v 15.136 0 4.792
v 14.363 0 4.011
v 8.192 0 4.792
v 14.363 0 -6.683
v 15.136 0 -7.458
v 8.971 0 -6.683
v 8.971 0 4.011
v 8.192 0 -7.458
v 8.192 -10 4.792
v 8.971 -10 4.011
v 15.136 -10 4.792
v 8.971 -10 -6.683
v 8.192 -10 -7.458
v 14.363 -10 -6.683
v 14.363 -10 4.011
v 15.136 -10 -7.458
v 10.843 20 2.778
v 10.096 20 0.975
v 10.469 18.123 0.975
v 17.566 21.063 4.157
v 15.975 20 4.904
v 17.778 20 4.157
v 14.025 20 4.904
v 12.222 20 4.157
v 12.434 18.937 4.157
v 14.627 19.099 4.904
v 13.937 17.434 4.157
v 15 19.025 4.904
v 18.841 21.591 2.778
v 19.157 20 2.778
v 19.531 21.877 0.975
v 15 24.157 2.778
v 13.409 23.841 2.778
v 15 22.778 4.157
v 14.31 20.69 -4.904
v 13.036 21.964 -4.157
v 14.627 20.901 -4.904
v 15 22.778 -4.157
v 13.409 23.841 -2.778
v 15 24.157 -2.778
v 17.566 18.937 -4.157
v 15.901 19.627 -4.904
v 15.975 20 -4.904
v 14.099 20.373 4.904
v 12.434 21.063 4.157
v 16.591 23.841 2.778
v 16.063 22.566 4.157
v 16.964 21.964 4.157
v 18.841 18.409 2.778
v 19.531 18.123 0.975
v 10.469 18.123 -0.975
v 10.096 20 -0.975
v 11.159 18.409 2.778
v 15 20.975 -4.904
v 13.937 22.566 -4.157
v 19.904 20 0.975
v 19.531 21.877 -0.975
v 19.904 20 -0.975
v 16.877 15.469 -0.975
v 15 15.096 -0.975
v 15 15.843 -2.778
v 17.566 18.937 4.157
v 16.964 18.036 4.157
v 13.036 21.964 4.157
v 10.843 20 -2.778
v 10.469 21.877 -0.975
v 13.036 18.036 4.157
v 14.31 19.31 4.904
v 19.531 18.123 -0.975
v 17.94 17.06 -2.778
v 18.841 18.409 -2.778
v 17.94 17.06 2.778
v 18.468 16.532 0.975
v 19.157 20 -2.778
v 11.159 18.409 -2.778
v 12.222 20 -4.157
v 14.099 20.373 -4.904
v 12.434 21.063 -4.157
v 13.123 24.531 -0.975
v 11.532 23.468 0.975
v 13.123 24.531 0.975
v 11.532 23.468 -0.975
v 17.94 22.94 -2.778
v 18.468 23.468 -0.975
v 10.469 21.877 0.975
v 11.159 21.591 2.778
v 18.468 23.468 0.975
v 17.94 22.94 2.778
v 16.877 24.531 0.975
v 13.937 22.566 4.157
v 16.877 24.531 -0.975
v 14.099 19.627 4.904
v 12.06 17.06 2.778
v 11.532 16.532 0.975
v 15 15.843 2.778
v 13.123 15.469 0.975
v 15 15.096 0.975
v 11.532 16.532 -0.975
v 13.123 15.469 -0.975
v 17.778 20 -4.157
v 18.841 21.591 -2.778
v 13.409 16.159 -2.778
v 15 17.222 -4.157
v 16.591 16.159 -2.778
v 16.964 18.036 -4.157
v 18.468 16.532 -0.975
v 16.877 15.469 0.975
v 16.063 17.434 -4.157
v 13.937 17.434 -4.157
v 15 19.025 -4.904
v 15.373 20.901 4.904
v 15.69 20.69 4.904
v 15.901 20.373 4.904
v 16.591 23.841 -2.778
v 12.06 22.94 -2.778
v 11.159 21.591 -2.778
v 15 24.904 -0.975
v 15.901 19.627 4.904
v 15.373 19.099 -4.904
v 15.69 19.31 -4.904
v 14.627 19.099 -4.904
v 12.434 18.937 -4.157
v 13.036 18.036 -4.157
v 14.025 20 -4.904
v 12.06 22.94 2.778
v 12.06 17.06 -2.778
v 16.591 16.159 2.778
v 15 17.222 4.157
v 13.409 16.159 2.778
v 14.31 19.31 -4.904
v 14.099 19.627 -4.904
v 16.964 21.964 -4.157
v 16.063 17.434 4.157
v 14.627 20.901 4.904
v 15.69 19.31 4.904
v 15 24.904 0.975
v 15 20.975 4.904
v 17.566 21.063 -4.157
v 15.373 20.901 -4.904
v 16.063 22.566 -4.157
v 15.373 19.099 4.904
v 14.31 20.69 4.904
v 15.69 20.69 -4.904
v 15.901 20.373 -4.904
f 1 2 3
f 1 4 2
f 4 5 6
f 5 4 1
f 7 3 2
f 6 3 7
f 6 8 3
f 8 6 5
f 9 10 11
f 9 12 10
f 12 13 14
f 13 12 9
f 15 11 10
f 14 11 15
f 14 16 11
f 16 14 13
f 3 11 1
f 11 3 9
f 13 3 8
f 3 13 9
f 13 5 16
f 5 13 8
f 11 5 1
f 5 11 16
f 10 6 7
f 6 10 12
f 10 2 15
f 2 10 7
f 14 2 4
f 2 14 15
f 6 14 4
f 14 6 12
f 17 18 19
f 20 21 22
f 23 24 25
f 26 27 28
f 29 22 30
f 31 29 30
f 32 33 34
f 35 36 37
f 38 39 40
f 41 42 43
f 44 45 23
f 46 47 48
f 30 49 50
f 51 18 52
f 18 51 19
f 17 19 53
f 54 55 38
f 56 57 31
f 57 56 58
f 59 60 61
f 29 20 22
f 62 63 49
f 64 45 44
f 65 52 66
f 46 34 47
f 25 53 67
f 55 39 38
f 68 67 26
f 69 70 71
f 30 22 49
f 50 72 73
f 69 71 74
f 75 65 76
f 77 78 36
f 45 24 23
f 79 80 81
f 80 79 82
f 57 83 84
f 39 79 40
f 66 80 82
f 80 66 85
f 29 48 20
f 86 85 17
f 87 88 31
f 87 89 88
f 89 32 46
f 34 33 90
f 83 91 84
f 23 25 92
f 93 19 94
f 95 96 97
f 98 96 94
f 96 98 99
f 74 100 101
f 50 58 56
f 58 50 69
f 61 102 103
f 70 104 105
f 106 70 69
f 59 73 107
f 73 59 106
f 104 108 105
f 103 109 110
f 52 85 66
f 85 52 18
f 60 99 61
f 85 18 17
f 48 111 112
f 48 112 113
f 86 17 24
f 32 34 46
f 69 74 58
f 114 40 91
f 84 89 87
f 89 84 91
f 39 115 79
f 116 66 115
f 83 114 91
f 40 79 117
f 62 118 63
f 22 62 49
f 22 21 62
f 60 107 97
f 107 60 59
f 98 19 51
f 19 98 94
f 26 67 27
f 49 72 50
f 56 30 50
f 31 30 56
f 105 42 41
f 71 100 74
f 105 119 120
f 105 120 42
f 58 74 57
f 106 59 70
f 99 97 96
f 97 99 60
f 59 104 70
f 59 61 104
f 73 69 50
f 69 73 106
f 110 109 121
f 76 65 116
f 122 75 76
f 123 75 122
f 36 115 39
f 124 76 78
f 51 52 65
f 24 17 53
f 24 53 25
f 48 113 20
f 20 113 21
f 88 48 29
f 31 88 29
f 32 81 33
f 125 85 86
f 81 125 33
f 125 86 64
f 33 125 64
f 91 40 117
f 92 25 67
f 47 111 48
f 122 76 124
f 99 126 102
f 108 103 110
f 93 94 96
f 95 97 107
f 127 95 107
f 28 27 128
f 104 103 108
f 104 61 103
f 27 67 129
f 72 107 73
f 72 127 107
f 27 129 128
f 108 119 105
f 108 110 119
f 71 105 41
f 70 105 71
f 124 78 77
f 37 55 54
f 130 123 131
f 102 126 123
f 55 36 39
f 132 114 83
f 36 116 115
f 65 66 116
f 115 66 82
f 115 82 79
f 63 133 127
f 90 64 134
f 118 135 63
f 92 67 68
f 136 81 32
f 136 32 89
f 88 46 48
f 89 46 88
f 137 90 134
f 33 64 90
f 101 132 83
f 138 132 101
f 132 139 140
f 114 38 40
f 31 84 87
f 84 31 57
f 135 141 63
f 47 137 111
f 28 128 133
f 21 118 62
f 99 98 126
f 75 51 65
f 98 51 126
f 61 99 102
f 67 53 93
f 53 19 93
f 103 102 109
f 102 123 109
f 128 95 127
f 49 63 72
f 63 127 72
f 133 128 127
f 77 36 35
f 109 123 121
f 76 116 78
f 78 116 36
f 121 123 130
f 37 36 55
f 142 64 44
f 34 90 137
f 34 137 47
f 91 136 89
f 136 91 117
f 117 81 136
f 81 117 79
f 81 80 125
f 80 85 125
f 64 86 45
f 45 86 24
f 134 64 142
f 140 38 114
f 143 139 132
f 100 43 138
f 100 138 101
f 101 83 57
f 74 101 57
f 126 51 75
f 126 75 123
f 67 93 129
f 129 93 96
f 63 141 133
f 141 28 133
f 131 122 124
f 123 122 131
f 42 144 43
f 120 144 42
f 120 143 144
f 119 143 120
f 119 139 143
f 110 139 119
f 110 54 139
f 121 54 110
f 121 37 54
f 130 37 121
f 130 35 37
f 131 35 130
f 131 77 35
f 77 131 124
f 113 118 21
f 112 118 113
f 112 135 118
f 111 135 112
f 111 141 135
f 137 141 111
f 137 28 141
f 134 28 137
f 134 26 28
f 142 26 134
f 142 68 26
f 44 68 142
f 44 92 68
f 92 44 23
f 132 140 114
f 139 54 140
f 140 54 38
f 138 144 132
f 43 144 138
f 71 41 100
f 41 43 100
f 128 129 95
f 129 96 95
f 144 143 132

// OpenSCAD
union() {

rotate([90,0,0])
translate([7.5,-5,0])
linear_extrude(10)
    text("春", font = "Kaiti");
    
translate([15,20,0])
    sphere(5);
}
